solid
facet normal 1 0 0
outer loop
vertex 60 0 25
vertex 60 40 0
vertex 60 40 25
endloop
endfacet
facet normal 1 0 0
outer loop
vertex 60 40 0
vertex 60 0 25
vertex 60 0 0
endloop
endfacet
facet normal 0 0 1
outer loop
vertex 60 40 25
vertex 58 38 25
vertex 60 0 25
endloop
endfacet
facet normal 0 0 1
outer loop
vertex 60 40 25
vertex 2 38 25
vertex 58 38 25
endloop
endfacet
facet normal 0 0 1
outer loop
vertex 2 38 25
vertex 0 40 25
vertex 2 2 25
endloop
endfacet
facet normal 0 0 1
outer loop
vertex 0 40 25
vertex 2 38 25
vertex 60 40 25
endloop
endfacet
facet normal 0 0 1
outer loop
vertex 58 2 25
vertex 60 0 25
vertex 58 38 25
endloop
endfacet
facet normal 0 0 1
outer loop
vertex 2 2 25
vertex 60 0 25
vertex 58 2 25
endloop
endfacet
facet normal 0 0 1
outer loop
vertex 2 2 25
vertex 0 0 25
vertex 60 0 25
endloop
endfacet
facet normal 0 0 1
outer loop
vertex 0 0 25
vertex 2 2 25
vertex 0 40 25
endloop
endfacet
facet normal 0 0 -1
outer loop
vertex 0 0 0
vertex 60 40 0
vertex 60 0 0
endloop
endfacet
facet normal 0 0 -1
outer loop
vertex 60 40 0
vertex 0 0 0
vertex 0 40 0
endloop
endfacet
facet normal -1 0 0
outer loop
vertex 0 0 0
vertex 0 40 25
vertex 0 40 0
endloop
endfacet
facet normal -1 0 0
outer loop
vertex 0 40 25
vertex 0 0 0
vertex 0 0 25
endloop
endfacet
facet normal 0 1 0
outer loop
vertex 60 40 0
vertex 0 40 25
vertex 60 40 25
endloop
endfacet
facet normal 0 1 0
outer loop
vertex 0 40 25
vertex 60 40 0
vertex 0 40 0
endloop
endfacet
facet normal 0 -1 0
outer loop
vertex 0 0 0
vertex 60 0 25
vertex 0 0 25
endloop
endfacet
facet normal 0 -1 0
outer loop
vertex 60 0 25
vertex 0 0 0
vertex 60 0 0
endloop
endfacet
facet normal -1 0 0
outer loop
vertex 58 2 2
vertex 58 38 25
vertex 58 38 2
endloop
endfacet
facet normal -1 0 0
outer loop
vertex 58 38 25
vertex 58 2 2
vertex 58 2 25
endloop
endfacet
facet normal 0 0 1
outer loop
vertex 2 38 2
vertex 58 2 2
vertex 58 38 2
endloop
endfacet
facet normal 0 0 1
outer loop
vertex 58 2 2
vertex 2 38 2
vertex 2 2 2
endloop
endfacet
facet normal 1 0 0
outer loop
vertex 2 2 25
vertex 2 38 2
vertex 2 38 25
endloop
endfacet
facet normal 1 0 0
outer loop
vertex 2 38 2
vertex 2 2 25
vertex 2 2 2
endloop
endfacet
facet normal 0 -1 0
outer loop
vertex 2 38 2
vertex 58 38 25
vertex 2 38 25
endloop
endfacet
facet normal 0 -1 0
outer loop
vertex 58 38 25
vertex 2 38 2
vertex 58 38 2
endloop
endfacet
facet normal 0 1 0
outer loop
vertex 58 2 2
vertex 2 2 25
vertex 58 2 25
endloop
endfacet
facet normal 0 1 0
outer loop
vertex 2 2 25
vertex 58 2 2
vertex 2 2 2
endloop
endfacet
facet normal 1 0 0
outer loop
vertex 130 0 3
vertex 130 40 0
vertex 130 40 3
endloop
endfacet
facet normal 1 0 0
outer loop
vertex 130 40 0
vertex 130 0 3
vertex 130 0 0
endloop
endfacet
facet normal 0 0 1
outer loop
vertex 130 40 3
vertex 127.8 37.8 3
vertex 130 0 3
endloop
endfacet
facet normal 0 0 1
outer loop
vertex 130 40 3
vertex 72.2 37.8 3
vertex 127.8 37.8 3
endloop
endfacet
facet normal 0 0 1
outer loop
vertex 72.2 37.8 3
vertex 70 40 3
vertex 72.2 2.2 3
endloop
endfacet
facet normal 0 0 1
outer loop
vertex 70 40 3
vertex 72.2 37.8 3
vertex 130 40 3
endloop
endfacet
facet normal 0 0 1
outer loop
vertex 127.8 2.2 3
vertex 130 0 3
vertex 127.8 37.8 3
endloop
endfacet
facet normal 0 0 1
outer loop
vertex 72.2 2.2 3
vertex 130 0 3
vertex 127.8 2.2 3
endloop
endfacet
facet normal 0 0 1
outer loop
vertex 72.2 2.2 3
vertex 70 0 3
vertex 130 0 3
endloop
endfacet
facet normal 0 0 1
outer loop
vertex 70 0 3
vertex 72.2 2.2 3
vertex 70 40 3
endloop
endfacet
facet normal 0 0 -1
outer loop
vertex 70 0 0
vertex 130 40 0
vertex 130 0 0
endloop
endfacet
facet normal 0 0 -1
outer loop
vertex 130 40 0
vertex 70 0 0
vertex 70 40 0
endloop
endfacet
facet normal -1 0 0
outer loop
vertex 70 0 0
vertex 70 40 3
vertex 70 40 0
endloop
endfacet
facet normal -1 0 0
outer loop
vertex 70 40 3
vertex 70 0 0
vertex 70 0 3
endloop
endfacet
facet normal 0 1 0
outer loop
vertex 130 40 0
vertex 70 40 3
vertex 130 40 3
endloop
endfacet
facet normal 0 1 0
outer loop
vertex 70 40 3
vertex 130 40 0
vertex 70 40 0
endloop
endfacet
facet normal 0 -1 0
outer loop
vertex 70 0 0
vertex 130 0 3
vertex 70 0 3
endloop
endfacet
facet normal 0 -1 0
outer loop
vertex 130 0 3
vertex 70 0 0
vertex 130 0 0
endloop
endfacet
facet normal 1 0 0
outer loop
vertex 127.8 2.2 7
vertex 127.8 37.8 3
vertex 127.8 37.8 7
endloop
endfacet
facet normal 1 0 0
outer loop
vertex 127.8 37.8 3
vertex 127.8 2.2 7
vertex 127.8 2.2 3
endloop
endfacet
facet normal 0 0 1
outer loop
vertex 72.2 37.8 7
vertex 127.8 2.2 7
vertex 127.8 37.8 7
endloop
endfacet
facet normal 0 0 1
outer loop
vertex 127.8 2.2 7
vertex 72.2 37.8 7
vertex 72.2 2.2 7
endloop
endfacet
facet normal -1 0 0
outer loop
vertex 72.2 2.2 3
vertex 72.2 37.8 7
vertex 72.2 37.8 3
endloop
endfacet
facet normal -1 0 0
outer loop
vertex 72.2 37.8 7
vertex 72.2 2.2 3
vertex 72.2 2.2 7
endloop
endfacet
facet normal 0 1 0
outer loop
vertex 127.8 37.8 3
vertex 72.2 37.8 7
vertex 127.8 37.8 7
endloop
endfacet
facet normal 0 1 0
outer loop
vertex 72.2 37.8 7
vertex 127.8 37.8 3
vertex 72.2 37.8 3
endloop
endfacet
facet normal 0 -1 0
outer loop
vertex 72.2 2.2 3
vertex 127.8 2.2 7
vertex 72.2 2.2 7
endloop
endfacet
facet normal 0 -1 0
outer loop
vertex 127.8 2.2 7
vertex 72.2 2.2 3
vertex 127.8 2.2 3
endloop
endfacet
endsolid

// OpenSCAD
// Two-part box and lid; the lid lip fits the opening with a per-side clearance.
box_x = 60;
box_y = 40;
box_z = 25;
wall = 2;
floor_t = 2;
clearance = 0.2;
lid_t = 3;
lip_h = 4;

module box() {
    difference() {
        cube([box_x, box_y, box_z]);
        translate([wall, wall, floor_t])
            cube([box_x - 2 * wall, box_y - 2 * wall, box_z]);
    }
}

module lid() {
    lip_x = box_x - 2 * wall - 2 * clearance;
    lip_y = box_y - 2 * wall - 2 * clearance;
    union() {
        cube([box_x, box_y, lid_t]);
        translate([(box_x - lip_x) / 2, (box_y - lip_y) / 2, lid_t])
            cube([lip_x, lip_y, lip_h]);
    }
}

box();
translate([70, 0, 0]) lid();
